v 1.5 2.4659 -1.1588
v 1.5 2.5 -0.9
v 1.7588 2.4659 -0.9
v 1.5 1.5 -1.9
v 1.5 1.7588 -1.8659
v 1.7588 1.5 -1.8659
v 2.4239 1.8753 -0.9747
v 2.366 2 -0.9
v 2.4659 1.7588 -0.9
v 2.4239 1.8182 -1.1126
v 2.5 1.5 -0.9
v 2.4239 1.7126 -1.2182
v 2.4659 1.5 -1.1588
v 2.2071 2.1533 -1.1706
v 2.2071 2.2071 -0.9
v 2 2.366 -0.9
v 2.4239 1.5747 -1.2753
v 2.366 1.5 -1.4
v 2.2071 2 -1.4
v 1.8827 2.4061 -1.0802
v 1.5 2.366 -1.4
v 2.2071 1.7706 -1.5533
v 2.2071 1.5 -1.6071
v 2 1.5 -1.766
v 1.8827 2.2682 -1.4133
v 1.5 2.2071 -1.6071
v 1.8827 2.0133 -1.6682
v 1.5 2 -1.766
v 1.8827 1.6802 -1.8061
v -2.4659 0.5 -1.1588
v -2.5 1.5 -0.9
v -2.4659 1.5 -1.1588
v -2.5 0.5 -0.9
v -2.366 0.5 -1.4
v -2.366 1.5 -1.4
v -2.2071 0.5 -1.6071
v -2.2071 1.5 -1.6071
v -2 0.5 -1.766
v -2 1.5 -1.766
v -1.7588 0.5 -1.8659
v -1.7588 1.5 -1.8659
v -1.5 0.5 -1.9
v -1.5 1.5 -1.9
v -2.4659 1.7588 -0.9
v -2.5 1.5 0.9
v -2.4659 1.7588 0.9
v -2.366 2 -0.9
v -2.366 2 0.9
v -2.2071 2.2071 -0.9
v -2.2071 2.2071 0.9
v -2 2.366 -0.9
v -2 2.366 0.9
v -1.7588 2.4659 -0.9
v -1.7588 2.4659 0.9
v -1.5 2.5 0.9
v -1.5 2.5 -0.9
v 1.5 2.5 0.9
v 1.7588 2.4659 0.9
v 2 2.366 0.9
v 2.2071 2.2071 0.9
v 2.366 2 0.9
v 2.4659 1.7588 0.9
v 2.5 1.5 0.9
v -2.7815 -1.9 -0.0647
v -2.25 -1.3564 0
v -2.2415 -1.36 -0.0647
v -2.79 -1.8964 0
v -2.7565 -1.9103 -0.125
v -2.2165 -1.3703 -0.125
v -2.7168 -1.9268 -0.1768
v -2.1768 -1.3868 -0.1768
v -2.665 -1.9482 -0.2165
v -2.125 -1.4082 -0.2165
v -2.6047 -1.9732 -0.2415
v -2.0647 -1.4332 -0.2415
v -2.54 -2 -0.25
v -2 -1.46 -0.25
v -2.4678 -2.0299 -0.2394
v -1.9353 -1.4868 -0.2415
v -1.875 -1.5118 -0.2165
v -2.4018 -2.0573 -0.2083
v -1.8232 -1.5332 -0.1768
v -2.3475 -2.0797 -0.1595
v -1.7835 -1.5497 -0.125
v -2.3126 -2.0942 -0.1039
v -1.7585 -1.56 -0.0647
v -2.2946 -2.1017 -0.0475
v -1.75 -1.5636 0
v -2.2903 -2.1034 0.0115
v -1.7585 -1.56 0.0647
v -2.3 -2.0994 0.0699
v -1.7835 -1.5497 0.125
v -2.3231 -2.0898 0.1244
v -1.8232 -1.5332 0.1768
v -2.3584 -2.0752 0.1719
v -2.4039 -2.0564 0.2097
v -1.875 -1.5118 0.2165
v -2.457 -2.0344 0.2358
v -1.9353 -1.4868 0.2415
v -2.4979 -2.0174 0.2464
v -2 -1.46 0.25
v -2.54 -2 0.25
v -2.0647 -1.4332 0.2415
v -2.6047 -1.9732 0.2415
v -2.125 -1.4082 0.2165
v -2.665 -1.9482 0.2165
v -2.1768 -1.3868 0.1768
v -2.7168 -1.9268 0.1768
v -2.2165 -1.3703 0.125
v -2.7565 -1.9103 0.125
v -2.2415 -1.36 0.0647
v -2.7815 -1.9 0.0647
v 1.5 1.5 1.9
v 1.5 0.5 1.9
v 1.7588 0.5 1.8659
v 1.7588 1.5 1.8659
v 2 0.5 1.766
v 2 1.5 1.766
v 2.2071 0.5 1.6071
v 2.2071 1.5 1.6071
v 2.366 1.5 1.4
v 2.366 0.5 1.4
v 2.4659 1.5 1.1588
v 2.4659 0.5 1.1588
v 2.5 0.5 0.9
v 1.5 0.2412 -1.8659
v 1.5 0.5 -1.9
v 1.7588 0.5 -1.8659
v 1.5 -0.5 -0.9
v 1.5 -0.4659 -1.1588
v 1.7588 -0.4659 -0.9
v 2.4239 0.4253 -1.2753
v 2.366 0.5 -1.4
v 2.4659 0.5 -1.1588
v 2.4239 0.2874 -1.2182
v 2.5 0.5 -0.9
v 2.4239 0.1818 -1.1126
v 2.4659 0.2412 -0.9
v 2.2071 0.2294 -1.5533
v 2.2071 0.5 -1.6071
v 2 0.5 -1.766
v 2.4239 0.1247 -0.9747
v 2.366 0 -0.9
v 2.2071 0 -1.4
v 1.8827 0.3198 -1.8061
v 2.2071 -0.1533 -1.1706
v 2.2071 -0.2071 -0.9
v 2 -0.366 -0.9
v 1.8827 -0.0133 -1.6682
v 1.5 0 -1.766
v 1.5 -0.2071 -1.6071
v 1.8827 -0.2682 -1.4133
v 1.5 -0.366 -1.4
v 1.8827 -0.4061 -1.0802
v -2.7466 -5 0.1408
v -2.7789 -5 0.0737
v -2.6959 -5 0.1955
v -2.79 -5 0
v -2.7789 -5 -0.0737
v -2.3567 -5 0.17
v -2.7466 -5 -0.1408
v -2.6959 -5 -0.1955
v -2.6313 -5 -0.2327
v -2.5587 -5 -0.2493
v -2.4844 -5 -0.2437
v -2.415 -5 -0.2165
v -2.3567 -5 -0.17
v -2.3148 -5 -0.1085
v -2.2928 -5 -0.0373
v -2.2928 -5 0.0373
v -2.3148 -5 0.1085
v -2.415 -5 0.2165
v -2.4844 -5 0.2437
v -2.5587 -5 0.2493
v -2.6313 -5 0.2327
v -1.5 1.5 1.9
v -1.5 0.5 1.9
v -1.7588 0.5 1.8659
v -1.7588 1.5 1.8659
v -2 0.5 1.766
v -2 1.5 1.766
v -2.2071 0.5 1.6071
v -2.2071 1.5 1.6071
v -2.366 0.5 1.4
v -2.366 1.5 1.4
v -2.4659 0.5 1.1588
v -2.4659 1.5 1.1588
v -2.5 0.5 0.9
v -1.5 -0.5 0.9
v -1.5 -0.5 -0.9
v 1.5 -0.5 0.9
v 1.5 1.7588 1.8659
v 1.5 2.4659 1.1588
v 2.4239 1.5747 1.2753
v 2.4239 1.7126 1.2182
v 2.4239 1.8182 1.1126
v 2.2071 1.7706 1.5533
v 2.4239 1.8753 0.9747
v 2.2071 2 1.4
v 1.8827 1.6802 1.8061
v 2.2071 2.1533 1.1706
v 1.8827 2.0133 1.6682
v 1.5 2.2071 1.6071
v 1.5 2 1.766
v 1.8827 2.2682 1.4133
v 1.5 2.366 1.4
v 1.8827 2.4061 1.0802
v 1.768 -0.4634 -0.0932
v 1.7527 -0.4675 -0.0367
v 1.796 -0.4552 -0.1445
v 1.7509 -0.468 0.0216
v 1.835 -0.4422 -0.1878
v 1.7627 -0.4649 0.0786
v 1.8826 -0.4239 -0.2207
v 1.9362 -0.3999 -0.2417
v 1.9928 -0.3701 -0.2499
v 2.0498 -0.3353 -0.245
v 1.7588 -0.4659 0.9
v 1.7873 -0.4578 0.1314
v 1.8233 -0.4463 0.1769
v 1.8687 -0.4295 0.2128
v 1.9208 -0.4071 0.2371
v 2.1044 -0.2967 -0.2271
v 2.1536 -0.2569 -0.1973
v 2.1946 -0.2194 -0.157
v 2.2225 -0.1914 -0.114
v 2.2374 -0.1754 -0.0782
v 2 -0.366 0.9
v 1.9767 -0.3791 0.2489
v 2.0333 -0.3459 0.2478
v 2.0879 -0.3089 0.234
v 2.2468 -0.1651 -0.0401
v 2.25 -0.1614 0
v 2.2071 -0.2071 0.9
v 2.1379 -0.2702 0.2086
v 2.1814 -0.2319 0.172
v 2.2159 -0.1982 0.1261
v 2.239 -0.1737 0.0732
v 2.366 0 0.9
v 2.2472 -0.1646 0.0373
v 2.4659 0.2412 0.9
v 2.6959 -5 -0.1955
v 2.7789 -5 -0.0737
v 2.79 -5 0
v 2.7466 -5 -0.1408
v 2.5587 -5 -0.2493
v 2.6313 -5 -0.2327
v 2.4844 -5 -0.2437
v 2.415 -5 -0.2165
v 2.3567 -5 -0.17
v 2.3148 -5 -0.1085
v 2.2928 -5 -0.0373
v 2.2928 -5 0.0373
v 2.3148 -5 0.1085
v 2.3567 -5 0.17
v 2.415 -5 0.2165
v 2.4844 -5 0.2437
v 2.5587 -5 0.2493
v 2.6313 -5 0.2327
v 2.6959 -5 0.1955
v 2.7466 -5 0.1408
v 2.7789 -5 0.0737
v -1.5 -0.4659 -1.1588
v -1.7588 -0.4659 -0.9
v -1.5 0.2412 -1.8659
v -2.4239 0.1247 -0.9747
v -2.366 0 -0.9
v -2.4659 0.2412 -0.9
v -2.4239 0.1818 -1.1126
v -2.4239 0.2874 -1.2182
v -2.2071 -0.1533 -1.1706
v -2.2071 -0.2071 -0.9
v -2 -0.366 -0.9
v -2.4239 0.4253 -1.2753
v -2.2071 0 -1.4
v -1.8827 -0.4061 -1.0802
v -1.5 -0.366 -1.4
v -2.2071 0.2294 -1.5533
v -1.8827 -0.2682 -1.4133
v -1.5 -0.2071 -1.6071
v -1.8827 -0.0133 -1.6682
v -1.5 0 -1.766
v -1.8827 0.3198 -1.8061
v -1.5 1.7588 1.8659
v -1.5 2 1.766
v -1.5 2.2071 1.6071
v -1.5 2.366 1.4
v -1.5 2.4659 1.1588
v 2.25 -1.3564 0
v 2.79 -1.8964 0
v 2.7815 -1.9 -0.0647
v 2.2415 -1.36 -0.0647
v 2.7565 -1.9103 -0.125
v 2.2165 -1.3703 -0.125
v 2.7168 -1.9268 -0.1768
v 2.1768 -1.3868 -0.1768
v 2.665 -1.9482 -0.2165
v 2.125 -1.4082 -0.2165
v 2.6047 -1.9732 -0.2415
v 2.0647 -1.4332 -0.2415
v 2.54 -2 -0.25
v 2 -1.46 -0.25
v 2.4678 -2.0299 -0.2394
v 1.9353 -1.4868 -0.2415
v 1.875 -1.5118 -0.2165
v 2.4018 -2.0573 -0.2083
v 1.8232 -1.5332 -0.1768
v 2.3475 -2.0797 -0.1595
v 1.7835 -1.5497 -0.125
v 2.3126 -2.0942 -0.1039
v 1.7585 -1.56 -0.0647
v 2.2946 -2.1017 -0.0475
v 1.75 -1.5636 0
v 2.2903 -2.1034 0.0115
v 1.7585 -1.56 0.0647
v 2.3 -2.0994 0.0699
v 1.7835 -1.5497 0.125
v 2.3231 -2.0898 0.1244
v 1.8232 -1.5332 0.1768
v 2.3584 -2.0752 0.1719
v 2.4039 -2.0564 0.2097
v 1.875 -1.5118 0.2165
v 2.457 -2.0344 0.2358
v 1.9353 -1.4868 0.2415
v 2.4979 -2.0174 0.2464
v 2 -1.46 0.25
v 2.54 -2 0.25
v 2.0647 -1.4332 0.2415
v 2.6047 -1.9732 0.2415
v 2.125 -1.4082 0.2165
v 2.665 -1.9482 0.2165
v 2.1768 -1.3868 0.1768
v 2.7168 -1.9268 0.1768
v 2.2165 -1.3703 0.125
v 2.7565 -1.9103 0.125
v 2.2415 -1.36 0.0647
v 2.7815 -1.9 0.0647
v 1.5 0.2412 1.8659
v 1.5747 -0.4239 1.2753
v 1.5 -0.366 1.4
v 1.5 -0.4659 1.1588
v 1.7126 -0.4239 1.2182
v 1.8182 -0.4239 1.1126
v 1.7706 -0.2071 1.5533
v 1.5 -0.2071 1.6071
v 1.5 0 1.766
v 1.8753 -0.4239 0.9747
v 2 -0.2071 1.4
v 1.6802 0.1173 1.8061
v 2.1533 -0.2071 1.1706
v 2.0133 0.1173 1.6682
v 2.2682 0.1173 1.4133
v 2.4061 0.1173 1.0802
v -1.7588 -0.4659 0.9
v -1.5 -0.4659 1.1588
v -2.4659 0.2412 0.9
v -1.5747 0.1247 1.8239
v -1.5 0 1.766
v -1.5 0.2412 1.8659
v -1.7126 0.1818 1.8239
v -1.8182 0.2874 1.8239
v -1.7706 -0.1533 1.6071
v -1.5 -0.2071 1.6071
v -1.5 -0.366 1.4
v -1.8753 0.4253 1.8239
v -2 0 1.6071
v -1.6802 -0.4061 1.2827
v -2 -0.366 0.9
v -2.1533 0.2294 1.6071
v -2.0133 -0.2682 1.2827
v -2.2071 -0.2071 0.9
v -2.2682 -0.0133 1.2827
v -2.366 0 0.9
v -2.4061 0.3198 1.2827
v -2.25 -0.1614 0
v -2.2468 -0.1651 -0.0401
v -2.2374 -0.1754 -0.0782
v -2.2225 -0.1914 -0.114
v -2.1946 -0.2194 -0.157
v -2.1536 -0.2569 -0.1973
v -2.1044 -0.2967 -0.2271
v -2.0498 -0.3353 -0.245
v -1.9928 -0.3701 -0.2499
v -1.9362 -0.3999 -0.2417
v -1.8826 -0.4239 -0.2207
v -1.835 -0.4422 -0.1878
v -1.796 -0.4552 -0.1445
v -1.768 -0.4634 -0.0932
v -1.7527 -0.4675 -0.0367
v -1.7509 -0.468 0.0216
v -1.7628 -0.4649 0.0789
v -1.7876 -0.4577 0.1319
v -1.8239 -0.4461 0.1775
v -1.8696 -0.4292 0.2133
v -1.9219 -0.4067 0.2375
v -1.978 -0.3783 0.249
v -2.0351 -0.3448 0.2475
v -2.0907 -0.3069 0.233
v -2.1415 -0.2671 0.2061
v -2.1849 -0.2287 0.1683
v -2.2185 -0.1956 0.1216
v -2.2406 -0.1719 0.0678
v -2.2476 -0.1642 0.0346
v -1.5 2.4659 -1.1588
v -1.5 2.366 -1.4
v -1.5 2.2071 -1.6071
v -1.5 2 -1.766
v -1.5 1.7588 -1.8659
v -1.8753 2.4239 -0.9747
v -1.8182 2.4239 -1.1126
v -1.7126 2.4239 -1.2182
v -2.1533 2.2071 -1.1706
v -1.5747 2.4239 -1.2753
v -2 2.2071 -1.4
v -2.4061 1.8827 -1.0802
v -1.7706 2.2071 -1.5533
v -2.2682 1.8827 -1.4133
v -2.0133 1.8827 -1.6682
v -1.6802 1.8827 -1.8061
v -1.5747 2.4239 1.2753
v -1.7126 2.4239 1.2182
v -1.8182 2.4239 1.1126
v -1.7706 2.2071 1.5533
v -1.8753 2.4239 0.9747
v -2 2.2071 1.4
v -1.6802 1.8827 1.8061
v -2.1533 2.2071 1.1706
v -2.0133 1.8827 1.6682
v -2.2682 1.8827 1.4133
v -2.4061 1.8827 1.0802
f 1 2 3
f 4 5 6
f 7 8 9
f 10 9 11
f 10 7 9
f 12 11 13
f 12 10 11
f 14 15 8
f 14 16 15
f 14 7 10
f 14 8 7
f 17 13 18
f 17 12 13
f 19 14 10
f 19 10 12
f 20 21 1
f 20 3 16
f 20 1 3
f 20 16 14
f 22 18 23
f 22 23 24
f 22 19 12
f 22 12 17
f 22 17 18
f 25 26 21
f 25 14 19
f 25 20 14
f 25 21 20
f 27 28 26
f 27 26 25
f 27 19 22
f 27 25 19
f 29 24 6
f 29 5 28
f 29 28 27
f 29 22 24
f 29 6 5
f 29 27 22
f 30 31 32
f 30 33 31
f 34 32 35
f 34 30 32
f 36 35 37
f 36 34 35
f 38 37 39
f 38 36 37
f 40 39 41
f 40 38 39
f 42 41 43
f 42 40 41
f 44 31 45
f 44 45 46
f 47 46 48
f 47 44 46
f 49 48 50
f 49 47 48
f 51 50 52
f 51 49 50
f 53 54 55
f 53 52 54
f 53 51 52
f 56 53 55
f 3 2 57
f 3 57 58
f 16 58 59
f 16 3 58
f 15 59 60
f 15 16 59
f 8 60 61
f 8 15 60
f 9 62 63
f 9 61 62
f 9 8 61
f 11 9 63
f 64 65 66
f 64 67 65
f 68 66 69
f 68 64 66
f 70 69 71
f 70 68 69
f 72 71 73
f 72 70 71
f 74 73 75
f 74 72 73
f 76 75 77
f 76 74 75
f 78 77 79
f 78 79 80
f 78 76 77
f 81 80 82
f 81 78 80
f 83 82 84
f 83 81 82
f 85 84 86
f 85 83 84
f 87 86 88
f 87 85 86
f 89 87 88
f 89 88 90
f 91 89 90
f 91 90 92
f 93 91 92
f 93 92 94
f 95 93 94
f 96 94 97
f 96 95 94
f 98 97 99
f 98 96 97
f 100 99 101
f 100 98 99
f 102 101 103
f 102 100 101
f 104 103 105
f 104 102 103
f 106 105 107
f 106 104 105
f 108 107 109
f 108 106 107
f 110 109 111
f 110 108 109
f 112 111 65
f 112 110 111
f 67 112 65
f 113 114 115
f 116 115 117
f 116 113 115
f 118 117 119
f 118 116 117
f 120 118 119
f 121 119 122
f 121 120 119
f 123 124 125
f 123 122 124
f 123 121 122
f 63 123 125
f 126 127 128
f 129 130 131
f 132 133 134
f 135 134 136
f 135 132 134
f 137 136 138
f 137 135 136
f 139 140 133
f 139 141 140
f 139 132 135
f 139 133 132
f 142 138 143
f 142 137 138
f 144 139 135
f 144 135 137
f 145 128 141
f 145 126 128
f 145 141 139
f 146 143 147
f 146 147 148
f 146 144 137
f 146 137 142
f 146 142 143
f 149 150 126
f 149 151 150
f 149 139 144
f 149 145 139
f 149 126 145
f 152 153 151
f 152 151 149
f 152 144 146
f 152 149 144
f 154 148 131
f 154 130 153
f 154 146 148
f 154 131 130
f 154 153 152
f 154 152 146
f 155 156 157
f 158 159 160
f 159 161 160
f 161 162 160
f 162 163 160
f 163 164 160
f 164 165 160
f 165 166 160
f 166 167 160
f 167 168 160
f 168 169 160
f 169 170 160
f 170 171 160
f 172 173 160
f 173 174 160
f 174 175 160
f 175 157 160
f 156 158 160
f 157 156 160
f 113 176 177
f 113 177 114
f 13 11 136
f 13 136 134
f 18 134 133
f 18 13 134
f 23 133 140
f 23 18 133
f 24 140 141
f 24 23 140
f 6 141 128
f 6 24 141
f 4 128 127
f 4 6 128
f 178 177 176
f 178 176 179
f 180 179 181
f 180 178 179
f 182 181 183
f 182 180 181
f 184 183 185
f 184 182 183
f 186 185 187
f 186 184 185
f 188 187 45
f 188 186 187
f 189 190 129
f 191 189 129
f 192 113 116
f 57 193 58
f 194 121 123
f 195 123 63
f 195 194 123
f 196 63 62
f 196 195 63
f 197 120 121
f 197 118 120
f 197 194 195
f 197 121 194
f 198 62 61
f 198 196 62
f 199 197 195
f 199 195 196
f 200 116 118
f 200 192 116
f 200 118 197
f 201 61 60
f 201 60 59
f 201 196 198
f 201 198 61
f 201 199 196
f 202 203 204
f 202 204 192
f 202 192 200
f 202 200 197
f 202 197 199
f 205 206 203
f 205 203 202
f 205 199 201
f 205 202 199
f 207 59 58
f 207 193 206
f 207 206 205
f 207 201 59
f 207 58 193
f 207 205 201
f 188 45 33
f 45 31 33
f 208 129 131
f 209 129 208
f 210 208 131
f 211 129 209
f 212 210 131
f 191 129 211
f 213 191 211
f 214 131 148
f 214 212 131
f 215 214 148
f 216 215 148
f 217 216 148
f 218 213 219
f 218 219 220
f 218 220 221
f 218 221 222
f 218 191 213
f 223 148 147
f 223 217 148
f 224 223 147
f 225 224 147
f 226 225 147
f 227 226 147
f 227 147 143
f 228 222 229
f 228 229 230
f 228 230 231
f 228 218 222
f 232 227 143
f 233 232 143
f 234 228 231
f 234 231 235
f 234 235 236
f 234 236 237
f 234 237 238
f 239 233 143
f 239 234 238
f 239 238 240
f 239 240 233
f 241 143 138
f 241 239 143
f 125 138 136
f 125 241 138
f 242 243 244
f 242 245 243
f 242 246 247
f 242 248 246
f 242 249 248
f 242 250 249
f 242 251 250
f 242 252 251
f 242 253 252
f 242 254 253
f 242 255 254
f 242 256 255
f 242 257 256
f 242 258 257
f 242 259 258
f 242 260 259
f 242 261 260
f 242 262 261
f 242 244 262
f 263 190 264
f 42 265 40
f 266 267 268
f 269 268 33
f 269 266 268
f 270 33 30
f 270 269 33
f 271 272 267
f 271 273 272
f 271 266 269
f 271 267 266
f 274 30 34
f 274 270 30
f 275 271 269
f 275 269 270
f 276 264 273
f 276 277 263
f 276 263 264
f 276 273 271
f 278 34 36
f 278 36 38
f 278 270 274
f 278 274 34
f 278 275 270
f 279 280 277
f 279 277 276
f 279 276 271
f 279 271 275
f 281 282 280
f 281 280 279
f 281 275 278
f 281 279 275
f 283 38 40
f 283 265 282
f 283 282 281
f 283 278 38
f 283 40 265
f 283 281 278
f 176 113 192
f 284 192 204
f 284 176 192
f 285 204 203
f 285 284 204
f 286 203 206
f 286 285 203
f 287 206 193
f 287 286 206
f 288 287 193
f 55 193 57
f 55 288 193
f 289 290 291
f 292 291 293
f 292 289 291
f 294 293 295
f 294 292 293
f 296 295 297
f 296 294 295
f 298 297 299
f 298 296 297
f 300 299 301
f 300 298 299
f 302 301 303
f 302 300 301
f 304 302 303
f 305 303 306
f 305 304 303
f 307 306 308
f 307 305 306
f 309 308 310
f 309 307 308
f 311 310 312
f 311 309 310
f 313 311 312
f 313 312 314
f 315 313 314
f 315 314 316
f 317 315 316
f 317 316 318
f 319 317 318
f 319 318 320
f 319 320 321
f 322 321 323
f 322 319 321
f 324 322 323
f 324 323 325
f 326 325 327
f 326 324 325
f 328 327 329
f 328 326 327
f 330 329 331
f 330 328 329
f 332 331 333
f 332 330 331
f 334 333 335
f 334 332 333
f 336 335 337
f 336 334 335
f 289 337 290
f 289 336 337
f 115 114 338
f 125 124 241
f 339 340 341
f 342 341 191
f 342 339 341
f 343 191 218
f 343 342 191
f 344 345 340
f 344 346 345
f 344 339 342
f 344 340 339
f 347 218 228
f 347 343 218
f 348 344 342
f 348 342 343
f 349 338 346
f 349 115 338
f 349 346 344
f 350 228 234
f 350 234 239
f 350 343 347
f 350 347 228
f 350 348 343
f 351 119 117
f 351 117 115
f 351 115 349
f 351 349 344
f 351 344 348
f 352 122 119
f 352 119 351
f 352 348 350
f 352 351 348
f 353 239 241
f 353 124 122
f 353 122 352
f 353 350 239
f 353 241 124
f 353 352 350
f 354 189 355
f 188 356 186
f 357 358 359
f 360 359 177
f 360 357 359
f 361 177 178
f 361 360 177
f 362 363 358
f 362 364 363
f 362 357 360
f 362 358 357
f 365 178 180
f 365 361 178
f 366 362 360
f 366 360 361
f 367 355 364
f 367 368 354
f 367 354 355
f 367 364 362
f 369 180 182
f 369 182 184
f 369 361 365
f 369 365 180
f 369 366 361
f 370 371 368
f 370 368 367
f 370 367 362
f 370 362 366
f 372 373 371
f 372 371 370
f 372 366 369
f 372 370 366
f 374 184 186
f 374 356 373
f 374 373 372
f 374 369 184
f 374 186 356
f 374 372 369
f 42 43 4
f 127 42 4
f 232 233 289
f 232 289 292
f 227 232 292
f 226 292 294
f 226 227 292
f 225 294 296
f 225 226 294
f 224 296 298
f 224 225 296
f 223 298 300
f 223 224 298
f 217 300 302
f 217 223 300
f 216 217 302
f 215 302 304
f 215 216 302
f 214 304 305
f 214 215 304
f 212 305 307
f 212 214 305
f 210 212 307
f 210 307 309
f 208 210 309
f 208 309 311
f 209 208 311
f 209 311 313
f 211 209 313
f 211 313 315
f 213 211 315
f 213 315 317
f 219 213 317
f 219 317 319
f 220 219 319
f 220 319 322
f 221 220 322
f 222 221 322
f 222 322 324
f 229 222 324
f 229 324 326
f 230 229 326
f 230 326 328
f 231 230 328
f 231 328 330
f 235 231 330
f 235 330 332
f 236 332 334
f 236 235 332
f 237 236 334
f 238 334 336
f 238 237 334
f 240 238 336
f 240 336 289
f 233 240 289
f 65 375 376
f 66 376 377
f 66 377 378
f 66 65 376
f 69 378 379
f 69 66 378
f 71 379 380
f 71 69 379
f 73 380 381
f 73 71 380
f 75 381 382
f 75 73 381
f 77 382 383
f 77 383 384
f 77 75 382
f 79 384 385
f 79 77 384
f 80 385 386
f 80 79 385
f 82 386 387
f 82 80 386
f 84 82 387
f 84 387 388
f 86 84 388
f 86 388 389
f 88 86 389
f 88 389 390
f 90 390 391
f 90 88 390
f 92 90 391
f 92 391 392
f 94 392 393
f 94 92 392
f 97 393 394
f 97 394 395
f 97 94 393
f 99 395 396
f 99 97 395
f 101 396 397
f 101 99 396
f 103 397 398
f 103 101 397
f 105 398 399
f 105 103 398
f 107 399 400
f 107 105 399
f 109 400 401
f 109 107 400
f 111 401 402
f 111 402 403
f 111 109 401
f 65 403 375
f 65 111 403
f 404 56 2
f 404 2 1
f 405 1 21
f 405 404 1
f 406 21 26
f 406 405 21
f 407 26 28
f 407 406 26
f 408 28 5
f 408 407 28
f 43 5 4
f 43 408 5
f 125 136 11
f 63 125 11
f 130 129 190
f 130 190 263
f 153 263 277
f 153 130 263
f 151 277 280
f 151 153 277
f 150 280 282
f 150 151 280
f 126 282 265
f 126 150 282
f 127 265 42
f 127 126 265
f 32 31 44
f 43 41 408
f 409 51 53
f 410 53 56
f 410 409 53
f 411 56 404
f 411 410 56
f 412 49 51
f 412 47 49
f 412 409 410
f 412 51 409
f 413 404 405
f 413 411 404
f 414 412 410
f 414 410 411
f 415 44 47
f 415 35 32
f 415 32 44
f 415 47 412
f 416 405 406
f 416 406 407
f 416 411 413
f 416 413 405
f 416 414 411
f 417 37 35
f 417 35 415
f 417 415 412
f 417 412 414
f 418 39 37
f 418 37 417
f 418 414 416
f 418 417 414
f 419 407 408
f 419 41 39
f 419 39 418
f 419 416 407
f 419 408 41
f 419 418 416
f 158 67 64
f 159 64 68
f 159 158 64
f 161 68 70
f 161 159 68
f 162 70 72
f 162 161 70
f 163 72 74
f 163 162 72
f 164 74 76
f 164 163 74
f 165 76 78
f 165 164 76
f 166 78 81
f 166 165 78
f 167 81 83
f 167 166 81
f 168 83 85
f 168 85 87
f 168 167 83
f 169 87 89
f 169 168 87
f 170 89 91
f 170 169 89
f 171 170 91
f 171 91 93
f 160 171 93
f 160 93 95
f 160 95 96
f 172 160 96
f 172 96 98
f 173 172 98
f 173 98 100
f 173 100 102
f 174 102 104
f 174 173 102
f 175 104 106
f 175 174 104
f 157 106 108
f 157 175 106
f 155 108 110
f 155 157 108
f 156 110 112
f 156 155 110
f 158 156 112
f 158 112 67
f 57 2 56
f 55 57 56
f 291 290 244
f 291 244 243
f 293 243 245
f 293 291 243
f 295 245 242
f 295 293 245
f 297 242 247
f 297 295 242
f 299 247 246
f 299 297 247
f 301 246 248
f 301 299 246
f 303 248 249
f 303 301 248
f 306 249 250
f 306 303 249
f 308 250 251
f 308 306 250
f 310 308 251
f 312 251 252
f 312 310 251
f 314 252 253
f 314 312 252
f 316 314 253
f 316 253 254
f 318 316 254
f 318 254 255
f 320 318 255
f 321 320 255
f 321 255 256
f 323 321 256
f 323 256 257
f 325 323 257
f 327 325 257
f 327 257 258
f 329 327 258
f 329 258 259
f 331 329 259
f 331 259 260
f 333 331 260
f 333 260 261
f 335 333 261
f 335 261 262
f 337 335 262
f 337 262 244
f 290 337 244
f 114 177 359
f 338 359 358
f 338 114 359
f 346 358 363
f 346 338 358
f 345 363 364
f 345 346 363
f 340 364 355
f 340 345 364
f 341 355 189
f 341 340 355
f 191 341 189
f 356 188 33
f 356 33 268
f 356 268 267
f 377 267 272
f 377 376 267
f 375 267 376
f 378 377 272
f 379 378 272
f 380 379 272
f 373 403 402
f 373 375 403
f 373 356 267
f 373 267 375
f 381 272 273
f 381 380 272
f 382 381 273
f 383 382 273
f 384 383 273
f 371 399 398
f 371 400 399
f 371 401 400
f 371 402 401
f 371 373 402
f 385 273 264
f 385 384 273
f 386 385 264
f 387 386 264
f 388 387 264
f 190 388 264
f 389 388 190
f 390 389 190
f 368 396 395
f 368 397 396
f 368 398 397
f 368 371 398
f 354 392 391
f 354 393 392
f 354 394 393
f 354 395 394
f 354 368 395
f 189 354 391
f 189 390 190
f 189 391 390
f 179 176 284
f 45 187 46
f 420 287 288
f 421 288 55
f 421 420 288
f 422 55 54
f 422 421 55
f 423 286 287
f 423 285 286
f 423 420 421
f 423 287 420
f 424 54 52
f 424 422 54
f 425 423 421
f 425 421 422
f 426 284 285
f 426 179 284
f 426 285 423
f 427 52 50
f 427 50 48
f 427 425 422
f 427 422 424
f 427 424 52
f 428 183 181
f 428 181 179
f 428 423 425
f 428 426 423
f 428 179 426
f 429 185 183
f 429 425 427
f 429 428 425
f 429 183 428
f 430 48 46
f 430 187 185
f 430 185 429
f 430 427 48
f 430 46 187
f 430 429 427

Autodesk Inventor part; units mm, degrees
ref_plane "YZ Plane" through (0, 0, 0) normal (1, 0, 0) x (0, 1, 0)
ref_plane "XZ Plane" through (0, 0, 0) normal (0, 1, 0) x (-1, 0, 0)
ref_plane "XY Plane" through (0, 0, 0) normal (0, 0, 1) x (1, 0, 0)
sketch "Sketch1" plane through (0, 0, 0) normal (0, 0, 1) x (1, 0, 0)
  line L0 (-2.5, -0.5) -> (2.5, -0.5)
  line L1 (2.5, -0.5) -> (2.5, 2.5)
  line L2 (2.5, 2.5) -> (-2.5, 2.5)
  line L3 (-2.5, 2.5) -> (-2.5, -0.5)
  line L4 (-2.5, -0.5) -> (2.5, 2.5) construction
  line L5 (2.5, -0.5) -> (-2.5, 2.5) construction
  point P0 (0, 0)
  point P1 (0, 1)
  dimension "d0" = 5
  dimension "d1" = 3
  dimension "d10" = 1
  dimension "d11" = 0
extrude "Extrusion1" add sketch "Sketch1" along normal mid plane 3.8
sketch "Sketch2" plane through (0, 0, 0) normal (0, 0, 1) x (1, 0, 0)
  line L0 (0, 0) -> (-2, 0)
  line L1 (-2, 0) -> (-2, -1.46)
  line L2 (-2, -1.46) -> (-2.54, -2)
  line L3 (-2.54, -2) -> (-2.54, -5)
  line L4 (0, 0) -> (0, -4.5028) construction
  line L5 (0, 0) -> (2, 0)
  line L6 (2, 0) -> (2, -1.46)
  line L7 (2, -1.46) -> (2.54, -2)
  line L8 (2.54, -2) -> (2.54, -5)
  dimension "d4" = 3
  dimension "d5" = 2.54
  dimension "d6" = 45
  dimension "d8" = 2
  dimension "d9" = 2
fillet "Fillet1" radius 1 12 edges at (0, -0.5, -1.9) (-2.5, 1, -1.9) (0, 2.5, -1.9) (2.5, 1, -1.9) (-2.5, -0.5, 0) (-2.5, 1, 1.9) (-2.5, 2.5, 0) (0, 2.5, 1.9) (2.5, 2.5, 0) (2.5, 1, 1.9) (2.5, -0.5, 0) (0, -0.5, 1.9)
sketch "Sketch3" plane through (0, 0, 0) normal (1, 0, 0) x (0, 1, 0)
  circle A0 centre (0, 0) radius 0.25
  dimension "d13" = 0.5
sweep "Sweep1" add profiles "Sketch3" path "Sketch2"
properties part number "Capacitor"
